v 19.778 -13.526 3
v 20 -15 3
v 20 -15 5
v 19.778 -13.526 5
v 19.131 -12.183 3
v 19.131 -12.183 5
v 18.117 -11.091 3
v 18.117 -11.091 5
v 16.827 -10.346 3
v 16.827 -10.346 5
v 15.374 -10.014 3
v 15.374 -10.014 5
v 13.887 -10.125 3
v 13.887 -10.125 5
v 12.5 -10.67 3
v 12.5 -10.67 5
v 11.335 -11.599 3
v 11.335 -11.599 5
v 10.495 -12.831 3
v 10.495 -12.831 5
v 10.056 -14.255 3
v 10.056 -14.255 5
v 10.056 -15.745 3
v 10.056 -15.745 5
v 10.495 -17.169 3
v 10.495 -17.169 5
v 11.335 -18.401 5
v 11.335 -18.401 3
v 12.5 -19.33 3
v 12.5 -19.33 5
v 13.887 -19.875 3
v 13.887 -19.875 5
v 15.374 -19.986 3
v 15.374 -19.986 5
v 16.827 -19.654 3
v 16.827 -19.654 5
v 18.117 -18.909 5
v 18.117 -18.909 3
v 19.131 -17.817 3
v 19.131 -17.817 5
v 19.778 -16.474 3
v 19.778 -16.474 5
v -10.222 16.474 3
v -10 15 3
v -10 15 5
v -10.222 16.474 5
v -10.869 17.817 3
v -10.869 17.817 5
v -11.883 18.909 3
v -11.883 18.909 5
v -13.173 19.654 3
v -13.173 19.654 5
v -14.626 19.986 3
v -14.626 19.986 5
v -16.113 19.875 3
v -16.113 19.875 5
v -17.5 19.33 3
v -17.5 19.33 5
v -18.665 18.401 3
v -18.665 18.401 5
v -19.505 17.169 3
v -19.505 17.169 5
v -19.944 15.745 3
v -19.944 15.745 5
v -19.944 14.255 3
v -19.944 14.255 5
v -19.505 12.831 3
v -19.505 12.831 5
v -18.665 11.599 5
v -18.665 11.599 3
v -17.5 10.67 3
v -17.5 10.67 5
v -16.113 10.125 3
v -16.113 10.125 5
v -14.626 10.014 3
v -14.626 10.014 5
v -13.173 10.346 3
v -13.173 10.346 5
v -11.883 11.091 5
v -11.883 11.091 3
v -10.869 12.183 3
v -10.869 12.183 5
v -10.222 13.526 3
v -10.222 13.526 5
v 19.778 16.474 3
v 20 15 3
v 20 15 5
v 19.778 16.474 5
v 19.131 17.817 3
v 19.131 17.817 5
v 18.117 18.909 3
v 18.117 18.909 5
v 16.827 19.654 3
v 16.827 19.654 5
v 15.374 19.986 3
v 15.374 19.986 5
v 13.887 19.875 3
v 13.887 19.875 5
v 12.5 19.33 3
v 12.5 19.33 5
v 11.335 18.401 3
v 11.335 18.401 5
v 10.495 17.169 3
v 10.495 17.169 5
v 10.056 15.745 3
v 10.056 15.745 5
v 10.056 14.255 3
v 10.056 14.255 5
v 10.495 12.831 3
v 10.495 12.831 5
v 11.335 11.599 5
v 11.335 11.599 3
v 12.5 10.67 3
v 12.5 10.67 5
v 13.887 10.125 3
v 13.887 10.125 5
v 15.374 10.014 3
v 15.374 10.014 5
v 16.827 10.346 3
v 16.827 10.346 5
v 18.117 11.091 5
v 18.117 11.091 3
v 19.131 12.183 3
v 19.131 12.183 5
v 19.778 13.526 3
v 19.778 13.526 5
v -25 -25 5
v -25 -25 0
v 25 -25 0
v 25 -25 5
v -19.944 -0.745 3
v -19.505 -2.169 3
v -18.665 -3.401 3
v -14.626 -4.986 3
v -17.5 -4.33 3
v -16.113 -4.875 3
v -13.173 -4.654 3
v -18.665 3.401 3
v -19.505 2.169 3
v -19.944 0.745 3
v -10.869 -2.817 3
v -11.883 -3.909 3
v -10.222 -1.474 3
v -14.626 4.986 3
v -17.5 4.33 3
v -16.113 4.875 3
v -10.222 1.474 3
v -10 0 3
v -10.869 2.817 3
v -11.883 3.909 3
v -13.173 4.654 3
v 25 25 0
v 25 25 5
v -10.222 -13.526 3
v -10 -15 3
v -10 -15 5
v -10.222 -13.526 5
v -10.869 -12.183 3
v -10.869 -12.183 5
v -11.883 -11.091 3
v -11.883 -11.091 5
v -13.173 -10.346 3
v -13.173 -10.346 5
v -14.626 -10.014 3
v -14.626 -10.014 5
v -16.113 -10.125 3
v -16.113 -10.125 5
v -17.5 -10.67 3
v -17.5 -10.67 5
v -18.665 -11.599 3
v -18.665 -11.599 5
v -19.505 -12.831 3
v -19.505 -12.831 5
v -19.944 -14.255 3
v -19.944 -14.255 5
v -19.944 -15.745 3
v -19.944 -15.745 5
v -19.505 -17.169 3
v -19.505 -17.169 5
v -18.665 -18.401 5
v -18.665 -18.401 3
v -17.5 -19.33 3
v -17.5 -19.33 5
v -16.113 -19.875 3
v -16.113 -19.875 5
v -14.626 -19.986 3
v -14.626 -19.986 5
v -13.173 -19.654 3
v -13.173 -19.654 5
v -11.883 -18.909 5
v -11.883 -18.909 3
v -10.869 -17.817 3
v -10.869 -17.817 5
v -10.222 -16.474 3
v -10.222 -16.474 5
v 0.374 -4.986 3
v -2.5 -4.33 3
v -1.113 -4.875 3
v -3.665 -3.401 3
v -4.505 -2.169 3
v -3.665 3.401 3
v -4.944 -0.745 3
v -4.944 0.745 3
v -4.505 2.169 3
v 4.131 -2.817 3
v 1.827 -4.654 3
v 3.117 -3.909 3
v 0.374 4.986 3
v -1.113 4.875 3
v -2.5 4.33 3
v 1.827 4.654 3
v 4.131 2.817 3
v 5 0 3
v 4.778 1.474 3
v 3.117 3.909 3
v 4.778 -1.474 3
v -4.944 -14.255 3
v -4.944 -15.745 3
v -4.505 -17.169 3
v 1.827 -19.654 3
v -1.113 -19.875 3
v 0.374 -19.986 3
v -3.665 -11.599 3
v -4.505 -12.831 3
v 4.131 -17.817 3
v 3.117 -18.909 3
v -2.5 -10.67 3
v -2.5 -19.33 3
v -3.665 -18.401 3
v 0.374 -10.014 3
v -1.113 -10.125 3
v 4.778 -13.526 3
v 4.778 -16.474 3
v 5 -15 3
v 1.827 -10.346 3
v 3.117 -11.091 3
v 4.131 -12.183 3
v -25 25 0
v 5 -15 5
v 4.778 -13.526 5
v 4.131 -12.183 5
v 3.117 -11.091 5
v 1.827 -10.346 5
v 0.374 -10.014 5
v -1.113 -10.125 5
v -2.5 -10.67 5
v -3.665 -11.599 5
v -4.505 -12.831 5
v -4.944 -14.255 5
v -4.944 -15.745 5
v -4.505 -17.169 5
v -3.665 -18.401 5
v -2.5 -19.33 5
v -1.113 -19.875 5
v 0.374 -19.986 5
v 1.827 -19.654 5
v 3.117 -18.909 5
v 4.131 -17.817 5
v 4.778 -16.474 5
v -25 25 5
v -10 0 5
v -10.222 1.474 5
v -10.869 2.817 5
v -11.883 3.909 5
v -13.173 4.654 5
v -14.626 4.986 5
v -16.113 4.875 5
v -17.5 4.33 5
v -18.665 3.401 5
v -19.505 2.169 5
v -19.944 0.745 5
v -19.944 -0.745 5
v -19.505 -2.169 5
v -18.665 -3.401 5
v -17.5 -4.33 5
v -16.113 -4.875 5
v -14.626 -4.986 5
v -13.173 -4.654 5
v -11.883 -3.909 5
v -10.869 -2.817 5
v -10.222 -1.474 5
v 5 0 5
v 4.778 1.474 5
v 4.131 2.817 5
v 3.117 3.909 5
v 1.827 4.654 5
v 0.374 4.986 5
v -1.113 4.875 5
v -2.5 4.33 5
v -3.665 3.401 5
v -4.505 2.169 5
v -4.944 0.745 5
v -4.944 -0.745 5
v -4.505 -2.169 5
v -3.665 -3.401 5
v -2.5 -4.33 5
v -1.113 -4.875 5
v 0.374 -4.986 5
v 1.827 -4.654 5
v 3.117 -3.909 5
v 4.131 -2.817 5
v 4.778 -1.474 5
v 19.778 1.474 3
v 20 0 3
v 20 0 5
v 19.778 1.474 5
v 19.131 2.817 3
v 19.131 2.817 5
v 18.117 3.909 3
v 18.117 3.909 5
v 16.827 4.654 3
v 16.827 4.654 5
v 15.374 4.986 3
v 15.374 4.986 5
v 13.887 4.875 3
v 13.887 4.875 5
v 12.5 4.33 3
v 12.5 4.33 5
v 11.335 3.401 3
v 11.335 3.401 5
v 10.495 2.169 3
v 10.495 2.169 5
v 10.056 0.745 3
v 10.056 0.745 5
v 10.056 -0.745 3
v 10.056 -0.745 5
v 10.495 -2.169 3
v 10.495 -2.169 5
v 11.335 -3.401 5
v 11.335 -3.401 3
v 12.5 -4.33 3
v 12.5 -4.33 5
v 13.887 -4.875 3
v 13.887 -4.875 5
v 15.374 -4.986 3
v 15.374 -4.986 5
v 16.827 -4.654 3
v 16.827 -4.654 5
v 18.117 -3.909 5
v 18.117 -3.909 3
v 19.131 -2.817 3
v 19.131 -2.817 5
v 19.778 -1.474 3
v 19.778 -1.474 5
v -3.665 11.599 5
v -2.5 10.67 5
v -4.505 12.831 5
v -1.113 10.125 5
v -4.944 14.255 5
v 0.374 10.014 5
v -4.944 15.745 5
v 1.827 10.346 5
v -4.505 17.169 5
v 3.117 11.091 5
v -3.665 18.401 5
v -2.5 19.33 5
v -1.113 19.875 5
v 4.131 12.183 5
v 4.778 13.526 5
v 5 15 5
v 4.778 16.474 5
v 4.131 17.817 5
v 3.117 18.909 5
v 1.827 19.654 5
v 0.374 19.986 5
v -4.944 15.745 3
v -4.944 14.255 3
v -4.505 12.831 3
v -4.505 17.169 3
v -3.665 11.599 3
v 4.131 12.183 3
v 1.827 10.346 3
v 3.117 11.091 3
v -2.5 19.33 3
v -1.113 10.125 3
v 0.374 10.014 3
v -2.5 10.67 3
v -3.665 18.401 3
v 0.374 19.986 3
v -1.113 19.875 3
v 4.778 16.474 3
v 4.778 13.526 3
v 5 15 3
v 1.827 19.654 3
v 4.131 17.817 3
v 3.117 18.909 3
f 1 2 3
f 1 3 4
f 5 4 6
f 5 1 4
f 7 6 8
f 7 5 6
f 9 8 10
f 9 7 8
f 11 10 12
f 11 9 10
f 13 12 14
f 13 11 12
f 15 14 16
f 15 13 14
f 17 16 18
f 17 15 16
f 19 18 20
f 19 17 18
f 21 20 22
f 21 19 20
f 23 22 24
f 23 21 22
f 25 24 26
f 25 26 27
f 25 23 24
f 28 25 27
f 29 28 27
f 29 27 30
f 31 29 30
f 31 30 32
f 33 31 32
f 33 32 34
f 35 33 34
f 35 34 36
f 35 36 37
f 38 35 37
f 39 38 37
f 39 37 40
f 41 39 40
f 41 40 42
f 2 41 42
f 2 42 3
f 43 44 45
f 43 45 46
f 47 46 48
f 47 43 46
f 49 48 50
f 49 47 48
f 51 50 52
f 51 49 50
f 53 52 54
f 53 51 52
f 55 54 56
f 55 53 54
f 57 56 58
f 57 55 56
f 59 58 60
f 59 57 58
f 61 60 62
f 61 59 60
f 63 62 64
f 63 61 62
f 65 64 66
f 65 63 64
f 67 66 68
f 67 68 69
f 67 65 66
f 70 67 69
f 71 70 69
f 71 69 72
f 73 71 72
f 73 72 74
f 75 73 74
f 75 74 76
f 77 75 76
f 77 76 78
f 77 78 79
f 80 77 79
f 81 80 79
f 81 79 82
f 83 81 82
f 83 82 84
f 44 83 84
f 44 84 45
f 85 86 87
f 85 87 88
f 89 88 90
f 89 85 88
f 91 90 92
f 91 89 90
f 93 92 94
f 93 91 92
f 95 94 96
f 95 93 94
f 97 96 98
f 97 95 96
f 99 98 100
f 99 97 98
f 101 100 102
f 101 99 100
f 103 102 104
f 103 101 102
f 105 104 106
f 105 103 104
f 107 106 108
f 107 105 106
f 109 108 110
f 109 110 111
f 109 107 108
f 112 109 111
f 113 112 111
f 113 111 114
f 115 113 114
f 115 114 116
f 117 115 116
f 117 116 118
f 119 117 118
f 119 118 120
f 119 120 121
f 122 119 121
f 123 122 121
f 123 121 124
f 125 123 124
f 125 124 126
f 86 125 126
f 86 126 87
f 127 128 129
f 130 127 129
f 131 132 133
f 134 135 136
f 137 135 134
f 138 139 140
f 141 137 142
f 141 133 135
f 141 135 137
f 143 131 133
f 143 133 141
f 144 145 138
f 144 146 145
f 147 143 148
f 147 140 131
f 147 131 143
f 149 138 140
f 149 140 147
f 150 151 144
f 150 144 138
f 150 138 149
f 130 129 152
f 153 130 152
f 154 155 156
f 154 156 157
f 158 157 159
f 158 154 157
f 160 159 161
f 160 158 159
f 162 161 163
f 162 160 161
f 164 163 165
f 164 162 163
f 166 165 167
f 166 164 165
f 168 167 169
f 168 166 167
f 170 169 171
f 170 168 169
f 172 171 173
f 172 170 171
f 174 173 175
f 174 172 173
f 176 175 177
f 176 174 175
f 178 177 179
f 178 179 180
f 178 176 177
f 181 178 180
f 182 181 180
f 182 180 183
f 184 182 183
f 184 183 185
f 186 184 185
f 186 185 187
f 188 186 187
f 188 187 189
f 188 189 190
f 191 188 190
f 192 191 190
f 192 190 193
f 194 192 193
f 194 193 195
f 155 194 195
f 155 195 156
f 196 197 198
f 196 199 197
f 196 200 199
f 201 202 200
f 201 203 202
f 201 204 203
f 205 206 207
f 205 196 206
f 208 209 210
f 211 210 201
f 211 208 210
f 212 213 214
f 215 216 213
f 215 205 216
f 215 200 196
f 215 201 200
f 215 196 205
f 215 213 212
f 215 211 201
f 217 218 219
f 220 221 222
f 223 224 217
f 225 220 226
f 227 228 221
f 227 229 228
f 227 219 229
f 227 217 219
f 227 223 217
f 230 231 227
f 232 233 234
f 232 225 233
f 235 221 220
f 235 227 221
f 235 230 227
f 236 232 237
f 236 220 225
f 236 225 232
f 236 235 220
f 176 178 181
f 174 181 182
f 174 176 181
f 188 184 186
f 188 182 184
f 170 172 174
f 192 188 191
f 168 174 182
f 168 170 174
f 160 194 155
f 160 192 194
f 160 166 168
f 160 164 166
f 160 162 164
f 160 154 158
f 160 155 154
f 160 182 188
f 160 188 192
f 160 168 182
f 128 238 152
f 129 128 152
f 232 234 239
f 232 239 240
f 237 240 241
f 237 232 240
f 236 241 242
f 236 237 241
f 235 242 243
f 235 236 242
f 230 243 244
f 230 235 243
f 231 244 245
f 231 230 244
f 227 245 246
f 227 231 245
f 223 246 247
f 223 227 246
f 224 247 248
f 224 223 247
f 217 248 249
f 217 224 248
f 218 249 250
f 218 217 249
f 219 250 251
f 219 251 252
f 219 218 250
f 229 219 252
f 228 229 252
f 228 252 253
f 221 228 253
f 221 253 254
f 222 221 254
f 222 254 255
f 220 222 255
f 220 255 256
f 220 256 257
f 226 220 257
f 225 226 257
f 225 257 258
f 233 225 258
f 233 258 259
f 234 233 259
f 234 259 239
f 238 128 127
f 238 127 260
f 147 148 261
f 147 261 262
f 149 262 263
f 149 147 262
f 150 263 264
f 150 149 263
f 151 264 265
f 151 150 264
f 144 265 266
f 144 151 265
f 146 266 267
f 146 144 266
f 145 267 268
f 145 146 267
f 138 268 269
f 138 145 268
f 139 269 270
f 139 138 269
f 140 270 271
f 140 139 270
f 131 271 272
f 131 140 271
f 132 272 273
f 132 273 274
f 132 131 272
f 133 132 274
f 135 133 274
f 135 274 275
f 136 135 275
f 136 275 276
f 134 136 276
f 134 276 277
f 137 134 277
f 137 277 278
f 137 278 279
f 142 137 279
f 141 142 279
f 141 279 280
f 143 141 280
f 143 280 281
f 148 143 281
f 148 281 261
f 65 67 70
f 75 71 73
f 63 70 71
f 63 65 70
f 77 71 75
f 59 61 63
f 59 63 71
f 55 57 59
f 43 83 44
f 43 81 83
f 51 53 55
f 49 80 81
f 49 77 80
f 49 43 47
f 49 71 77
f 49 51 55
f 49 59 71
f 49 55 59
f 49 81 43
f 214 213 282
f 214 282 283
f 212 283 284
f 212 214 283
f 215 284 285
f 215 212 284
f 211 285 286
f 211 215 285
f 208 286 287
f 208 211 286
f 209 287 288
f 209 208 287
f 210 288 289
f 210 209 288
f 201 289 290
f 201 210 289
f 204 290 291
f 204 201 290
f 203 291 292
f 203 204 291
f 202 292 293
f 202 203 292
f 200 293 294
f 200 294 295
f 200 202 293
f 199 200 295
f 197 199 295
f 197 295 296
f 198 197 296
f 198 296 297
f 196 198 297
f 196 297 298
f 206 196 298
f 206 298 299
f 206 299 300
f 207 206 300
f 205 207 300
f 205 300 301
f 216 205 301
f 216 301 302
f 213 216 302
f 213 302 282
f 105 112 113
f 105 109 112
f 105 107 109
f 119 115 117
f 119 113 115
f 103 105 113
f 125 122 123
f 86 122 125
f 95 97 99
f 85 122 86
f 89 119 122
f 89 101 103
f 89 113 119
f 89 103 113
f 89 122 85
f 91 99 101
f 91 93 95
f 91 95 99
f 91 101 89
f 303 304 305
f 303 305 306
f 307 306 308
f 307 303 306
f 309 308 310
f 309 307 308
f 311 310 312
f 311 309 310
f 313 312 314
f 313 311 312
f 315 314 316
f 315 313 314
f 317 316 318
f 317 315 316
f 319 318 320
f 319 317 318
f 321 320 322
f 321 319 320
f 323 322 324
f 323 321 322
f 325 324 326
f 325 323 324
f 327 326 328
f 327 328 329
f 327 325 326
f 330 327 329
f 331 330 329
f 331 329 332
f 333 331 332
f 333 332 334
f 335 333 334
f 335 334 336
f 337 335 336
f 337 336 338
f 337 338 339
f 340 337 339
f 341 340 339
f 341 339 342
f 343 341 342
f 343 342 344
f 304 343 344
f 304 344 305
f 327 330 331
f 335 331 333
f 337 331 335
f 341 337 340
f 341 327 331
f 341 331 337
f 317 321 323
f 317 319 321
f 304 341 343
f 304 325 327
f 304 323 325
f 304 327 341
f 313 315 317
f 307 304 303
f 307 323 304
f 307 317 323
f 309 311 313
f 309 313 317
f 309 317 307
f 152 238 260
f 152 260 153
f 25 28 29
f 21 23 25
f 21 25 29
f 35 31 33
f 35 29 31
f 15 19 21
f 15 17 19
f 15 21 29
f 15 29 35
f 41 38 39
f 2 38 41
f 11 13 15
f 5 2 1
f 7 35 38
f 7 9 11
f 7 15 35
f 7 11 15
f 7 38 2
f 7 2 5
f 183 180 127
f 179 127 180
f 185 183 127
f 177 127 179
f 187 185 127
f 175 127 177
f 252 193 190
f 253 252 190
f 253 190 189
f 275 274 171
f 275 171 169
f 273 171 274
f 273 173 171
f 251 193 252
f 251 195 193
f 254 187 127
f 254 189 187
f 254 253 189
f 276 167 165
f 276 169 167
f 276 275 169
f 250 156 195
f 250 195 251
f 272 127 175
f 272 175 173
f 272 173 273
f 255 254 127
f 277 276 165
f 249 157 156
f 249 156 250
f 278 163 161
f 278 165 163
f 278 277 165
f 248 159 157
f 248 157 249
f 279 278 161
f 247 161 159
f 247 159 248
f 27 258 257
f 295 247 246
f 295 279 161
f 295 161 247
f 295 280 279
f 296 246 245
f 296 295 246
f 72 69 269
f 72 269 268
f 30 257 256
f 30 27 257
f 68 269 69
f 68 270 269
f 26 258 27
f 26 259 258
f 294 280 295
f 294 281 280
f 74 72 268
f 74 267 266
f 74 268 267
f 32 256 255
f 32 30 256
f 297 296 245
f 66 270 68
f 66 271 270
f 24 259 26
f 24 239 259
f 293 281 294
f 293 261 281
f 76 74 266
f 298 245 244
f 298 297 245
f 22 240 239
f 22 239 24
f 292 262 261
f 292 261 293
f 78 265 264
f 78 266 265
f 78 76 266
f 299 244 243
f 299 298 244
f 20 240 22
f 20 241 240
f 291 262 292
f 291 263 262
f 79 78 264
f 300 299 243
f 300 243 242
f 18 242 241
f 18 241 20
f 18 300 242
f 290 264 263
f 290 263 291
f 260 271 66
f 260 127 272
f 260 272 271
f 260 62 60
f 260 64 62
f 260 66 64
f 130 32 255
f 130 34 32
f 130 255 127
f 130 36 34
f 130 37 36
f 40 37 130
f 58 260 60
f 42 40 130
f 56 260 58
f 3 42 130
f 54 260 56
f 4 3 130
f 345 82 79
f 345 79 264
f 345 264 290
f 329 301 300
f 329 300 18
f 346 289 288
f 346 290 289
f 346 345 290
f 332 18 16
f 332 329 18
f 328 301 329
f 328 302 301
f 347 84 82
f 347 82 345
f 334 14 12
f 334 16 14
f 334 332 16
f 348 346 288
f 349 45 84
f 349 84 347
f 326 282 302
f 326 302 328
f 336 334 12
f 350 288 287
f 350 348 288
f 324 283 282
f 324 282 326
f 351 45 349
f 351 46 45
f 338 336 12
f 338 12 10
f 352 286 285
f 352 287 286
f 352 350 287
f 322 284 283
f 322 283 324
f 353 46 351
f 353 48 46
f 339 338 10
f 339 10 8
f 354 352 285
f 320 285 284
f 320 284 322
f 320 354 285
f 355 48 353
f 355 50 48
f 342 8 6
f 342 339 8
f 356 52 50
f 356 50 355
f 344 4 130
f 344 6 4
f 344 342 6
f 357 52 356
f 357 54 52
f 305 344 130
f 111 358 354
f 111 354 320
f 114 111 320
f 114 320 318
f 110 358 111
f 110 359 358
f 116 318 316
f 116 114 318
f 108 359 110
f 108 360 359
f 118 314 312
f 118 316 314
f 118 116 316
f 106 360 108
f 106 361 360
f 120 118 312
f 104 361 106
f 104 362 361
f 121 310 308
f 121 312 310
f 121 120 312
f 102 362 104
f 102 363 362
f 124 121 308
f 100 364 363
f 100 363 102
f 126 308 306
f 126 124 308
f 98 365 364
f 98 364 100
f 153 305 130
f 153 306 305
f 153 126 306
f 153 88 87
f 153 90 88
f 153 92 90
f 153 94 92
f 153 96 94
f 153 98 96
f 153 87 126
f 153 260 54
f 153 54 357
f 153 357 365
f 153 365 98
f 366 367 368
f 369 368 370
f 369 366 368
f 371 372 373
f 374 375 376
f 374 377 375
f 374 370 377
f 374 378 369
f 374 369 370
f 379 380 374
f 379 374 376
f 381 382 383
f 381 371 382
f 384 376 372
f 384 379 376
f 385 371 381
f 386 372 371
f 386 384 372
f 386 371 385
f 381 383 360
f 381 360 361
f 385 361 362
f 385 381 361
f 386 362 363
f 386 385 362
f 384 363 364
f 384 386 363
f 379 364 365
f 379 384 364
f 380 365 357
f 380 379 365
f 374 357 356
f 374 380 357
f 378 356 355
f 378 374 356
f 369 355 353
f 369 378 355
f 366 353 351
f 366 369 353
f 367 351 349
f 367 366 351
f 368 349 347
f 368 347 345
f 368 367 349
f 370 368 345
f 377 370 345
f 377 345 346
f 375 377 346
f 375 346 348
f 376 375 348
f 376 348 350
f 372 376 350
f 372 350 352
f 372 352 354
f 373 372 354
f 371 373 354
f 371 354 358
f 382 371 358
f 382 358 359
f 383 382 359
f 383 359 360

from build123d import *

# Parameters (mm, degrees)
F0_W     = 50
F0_H     = 50
F0_R     = 5
F1_DEPTH = 3
F2_DEPTH = 5


with BuildPart() as f1:
    # F0 (on Top) → F1 (new body)
    with BuildSketch(Plane.XY):
        Rectangle(F0_W, F0_H)
        with Locations((-15, -15)):
            Circle(F0_R, mode=Mode.SUBTRACT)
        with Locations((0, -15)):
            Circle(F0_R, mode=Mode.SUBTRACT)
        with Locations((15, -15)):
            Circle(F0_R, mode=Mode.SUBTRACT)
        with Locations((-15, 0)):
            Circle(F0_R, mode=Mode.SUBTRACT)
        with Locations((-15, 15)):
            Circle(F0_R, mode=Mode.SUBTRACT)
        Circle(F0_R, mode=Mode.SUBTRACT)
        with Locations((15, 0)):
            Circle(F0_R, mode=Mode.SUBTRACT)
        with Locations((0, 15)):
            Circle(F0_R, mode=Mode.SUBTRACT)
        with Locations((15, 15)):
            Circle(F0_R, mode=Mode.SUBTRACT)
        with Locations((-15, 15)):
            Circle(F0_R)
        with Locations((0, 15)):
            Circle(F0_R)
        with Locations((15, 15)):
            Circle(F0_R)
        with Locations((15, 0)):
            Circle(F0_R)
        Circle(F0_R)
        with Locations((-15, 0)):
            Circle(F0_R)
        with Locations((-15, -15)):
            Circle(F0_R)
        with Locations((0, -15)):
            Circle(F0_R)
        with Locations((15, -15)):
            Circle(F0_R)
    extrude(amount=F1_DEPTH)

    # F0 (on Top) → F2 (join)
    with BuildSketch(Plane.XY):
        Rectangle(F0_W, F0_H)
        with Locations((-15, -15)):
            Circle(F0_R, mode=Mode.SUBTRACT)
        with Locations((0, -15)):
            Circle(F0_R, mode=Mode.SUBTRACT)
        with Locations((15, -15)):
            Circle(F0_R, mode=Mode.SUBTRACT)
        with Locations((-15, 0)):
            Circle(F0_R, mode=Mode.SUBTRACT)
        with Locations((-15, 15)):
            Circle(F0_R, mode=Mode.SUBTRACT)
        Circle(F0_R, mode=Mode.SUBTRACT)
        with Locations((15, 0)):
            Circle(F0_R, mode=Mode.SUBTRACT)
        with Locations((0, 15)):
            Circle(F0_R, mode=Mode.SUBTRACT)
        with Locations((15, 15)):
            Circle(F0_R, mode=Mode.SUBTRACT)
    extrude(amount=F2_DEPTH)


solid = f1.part
